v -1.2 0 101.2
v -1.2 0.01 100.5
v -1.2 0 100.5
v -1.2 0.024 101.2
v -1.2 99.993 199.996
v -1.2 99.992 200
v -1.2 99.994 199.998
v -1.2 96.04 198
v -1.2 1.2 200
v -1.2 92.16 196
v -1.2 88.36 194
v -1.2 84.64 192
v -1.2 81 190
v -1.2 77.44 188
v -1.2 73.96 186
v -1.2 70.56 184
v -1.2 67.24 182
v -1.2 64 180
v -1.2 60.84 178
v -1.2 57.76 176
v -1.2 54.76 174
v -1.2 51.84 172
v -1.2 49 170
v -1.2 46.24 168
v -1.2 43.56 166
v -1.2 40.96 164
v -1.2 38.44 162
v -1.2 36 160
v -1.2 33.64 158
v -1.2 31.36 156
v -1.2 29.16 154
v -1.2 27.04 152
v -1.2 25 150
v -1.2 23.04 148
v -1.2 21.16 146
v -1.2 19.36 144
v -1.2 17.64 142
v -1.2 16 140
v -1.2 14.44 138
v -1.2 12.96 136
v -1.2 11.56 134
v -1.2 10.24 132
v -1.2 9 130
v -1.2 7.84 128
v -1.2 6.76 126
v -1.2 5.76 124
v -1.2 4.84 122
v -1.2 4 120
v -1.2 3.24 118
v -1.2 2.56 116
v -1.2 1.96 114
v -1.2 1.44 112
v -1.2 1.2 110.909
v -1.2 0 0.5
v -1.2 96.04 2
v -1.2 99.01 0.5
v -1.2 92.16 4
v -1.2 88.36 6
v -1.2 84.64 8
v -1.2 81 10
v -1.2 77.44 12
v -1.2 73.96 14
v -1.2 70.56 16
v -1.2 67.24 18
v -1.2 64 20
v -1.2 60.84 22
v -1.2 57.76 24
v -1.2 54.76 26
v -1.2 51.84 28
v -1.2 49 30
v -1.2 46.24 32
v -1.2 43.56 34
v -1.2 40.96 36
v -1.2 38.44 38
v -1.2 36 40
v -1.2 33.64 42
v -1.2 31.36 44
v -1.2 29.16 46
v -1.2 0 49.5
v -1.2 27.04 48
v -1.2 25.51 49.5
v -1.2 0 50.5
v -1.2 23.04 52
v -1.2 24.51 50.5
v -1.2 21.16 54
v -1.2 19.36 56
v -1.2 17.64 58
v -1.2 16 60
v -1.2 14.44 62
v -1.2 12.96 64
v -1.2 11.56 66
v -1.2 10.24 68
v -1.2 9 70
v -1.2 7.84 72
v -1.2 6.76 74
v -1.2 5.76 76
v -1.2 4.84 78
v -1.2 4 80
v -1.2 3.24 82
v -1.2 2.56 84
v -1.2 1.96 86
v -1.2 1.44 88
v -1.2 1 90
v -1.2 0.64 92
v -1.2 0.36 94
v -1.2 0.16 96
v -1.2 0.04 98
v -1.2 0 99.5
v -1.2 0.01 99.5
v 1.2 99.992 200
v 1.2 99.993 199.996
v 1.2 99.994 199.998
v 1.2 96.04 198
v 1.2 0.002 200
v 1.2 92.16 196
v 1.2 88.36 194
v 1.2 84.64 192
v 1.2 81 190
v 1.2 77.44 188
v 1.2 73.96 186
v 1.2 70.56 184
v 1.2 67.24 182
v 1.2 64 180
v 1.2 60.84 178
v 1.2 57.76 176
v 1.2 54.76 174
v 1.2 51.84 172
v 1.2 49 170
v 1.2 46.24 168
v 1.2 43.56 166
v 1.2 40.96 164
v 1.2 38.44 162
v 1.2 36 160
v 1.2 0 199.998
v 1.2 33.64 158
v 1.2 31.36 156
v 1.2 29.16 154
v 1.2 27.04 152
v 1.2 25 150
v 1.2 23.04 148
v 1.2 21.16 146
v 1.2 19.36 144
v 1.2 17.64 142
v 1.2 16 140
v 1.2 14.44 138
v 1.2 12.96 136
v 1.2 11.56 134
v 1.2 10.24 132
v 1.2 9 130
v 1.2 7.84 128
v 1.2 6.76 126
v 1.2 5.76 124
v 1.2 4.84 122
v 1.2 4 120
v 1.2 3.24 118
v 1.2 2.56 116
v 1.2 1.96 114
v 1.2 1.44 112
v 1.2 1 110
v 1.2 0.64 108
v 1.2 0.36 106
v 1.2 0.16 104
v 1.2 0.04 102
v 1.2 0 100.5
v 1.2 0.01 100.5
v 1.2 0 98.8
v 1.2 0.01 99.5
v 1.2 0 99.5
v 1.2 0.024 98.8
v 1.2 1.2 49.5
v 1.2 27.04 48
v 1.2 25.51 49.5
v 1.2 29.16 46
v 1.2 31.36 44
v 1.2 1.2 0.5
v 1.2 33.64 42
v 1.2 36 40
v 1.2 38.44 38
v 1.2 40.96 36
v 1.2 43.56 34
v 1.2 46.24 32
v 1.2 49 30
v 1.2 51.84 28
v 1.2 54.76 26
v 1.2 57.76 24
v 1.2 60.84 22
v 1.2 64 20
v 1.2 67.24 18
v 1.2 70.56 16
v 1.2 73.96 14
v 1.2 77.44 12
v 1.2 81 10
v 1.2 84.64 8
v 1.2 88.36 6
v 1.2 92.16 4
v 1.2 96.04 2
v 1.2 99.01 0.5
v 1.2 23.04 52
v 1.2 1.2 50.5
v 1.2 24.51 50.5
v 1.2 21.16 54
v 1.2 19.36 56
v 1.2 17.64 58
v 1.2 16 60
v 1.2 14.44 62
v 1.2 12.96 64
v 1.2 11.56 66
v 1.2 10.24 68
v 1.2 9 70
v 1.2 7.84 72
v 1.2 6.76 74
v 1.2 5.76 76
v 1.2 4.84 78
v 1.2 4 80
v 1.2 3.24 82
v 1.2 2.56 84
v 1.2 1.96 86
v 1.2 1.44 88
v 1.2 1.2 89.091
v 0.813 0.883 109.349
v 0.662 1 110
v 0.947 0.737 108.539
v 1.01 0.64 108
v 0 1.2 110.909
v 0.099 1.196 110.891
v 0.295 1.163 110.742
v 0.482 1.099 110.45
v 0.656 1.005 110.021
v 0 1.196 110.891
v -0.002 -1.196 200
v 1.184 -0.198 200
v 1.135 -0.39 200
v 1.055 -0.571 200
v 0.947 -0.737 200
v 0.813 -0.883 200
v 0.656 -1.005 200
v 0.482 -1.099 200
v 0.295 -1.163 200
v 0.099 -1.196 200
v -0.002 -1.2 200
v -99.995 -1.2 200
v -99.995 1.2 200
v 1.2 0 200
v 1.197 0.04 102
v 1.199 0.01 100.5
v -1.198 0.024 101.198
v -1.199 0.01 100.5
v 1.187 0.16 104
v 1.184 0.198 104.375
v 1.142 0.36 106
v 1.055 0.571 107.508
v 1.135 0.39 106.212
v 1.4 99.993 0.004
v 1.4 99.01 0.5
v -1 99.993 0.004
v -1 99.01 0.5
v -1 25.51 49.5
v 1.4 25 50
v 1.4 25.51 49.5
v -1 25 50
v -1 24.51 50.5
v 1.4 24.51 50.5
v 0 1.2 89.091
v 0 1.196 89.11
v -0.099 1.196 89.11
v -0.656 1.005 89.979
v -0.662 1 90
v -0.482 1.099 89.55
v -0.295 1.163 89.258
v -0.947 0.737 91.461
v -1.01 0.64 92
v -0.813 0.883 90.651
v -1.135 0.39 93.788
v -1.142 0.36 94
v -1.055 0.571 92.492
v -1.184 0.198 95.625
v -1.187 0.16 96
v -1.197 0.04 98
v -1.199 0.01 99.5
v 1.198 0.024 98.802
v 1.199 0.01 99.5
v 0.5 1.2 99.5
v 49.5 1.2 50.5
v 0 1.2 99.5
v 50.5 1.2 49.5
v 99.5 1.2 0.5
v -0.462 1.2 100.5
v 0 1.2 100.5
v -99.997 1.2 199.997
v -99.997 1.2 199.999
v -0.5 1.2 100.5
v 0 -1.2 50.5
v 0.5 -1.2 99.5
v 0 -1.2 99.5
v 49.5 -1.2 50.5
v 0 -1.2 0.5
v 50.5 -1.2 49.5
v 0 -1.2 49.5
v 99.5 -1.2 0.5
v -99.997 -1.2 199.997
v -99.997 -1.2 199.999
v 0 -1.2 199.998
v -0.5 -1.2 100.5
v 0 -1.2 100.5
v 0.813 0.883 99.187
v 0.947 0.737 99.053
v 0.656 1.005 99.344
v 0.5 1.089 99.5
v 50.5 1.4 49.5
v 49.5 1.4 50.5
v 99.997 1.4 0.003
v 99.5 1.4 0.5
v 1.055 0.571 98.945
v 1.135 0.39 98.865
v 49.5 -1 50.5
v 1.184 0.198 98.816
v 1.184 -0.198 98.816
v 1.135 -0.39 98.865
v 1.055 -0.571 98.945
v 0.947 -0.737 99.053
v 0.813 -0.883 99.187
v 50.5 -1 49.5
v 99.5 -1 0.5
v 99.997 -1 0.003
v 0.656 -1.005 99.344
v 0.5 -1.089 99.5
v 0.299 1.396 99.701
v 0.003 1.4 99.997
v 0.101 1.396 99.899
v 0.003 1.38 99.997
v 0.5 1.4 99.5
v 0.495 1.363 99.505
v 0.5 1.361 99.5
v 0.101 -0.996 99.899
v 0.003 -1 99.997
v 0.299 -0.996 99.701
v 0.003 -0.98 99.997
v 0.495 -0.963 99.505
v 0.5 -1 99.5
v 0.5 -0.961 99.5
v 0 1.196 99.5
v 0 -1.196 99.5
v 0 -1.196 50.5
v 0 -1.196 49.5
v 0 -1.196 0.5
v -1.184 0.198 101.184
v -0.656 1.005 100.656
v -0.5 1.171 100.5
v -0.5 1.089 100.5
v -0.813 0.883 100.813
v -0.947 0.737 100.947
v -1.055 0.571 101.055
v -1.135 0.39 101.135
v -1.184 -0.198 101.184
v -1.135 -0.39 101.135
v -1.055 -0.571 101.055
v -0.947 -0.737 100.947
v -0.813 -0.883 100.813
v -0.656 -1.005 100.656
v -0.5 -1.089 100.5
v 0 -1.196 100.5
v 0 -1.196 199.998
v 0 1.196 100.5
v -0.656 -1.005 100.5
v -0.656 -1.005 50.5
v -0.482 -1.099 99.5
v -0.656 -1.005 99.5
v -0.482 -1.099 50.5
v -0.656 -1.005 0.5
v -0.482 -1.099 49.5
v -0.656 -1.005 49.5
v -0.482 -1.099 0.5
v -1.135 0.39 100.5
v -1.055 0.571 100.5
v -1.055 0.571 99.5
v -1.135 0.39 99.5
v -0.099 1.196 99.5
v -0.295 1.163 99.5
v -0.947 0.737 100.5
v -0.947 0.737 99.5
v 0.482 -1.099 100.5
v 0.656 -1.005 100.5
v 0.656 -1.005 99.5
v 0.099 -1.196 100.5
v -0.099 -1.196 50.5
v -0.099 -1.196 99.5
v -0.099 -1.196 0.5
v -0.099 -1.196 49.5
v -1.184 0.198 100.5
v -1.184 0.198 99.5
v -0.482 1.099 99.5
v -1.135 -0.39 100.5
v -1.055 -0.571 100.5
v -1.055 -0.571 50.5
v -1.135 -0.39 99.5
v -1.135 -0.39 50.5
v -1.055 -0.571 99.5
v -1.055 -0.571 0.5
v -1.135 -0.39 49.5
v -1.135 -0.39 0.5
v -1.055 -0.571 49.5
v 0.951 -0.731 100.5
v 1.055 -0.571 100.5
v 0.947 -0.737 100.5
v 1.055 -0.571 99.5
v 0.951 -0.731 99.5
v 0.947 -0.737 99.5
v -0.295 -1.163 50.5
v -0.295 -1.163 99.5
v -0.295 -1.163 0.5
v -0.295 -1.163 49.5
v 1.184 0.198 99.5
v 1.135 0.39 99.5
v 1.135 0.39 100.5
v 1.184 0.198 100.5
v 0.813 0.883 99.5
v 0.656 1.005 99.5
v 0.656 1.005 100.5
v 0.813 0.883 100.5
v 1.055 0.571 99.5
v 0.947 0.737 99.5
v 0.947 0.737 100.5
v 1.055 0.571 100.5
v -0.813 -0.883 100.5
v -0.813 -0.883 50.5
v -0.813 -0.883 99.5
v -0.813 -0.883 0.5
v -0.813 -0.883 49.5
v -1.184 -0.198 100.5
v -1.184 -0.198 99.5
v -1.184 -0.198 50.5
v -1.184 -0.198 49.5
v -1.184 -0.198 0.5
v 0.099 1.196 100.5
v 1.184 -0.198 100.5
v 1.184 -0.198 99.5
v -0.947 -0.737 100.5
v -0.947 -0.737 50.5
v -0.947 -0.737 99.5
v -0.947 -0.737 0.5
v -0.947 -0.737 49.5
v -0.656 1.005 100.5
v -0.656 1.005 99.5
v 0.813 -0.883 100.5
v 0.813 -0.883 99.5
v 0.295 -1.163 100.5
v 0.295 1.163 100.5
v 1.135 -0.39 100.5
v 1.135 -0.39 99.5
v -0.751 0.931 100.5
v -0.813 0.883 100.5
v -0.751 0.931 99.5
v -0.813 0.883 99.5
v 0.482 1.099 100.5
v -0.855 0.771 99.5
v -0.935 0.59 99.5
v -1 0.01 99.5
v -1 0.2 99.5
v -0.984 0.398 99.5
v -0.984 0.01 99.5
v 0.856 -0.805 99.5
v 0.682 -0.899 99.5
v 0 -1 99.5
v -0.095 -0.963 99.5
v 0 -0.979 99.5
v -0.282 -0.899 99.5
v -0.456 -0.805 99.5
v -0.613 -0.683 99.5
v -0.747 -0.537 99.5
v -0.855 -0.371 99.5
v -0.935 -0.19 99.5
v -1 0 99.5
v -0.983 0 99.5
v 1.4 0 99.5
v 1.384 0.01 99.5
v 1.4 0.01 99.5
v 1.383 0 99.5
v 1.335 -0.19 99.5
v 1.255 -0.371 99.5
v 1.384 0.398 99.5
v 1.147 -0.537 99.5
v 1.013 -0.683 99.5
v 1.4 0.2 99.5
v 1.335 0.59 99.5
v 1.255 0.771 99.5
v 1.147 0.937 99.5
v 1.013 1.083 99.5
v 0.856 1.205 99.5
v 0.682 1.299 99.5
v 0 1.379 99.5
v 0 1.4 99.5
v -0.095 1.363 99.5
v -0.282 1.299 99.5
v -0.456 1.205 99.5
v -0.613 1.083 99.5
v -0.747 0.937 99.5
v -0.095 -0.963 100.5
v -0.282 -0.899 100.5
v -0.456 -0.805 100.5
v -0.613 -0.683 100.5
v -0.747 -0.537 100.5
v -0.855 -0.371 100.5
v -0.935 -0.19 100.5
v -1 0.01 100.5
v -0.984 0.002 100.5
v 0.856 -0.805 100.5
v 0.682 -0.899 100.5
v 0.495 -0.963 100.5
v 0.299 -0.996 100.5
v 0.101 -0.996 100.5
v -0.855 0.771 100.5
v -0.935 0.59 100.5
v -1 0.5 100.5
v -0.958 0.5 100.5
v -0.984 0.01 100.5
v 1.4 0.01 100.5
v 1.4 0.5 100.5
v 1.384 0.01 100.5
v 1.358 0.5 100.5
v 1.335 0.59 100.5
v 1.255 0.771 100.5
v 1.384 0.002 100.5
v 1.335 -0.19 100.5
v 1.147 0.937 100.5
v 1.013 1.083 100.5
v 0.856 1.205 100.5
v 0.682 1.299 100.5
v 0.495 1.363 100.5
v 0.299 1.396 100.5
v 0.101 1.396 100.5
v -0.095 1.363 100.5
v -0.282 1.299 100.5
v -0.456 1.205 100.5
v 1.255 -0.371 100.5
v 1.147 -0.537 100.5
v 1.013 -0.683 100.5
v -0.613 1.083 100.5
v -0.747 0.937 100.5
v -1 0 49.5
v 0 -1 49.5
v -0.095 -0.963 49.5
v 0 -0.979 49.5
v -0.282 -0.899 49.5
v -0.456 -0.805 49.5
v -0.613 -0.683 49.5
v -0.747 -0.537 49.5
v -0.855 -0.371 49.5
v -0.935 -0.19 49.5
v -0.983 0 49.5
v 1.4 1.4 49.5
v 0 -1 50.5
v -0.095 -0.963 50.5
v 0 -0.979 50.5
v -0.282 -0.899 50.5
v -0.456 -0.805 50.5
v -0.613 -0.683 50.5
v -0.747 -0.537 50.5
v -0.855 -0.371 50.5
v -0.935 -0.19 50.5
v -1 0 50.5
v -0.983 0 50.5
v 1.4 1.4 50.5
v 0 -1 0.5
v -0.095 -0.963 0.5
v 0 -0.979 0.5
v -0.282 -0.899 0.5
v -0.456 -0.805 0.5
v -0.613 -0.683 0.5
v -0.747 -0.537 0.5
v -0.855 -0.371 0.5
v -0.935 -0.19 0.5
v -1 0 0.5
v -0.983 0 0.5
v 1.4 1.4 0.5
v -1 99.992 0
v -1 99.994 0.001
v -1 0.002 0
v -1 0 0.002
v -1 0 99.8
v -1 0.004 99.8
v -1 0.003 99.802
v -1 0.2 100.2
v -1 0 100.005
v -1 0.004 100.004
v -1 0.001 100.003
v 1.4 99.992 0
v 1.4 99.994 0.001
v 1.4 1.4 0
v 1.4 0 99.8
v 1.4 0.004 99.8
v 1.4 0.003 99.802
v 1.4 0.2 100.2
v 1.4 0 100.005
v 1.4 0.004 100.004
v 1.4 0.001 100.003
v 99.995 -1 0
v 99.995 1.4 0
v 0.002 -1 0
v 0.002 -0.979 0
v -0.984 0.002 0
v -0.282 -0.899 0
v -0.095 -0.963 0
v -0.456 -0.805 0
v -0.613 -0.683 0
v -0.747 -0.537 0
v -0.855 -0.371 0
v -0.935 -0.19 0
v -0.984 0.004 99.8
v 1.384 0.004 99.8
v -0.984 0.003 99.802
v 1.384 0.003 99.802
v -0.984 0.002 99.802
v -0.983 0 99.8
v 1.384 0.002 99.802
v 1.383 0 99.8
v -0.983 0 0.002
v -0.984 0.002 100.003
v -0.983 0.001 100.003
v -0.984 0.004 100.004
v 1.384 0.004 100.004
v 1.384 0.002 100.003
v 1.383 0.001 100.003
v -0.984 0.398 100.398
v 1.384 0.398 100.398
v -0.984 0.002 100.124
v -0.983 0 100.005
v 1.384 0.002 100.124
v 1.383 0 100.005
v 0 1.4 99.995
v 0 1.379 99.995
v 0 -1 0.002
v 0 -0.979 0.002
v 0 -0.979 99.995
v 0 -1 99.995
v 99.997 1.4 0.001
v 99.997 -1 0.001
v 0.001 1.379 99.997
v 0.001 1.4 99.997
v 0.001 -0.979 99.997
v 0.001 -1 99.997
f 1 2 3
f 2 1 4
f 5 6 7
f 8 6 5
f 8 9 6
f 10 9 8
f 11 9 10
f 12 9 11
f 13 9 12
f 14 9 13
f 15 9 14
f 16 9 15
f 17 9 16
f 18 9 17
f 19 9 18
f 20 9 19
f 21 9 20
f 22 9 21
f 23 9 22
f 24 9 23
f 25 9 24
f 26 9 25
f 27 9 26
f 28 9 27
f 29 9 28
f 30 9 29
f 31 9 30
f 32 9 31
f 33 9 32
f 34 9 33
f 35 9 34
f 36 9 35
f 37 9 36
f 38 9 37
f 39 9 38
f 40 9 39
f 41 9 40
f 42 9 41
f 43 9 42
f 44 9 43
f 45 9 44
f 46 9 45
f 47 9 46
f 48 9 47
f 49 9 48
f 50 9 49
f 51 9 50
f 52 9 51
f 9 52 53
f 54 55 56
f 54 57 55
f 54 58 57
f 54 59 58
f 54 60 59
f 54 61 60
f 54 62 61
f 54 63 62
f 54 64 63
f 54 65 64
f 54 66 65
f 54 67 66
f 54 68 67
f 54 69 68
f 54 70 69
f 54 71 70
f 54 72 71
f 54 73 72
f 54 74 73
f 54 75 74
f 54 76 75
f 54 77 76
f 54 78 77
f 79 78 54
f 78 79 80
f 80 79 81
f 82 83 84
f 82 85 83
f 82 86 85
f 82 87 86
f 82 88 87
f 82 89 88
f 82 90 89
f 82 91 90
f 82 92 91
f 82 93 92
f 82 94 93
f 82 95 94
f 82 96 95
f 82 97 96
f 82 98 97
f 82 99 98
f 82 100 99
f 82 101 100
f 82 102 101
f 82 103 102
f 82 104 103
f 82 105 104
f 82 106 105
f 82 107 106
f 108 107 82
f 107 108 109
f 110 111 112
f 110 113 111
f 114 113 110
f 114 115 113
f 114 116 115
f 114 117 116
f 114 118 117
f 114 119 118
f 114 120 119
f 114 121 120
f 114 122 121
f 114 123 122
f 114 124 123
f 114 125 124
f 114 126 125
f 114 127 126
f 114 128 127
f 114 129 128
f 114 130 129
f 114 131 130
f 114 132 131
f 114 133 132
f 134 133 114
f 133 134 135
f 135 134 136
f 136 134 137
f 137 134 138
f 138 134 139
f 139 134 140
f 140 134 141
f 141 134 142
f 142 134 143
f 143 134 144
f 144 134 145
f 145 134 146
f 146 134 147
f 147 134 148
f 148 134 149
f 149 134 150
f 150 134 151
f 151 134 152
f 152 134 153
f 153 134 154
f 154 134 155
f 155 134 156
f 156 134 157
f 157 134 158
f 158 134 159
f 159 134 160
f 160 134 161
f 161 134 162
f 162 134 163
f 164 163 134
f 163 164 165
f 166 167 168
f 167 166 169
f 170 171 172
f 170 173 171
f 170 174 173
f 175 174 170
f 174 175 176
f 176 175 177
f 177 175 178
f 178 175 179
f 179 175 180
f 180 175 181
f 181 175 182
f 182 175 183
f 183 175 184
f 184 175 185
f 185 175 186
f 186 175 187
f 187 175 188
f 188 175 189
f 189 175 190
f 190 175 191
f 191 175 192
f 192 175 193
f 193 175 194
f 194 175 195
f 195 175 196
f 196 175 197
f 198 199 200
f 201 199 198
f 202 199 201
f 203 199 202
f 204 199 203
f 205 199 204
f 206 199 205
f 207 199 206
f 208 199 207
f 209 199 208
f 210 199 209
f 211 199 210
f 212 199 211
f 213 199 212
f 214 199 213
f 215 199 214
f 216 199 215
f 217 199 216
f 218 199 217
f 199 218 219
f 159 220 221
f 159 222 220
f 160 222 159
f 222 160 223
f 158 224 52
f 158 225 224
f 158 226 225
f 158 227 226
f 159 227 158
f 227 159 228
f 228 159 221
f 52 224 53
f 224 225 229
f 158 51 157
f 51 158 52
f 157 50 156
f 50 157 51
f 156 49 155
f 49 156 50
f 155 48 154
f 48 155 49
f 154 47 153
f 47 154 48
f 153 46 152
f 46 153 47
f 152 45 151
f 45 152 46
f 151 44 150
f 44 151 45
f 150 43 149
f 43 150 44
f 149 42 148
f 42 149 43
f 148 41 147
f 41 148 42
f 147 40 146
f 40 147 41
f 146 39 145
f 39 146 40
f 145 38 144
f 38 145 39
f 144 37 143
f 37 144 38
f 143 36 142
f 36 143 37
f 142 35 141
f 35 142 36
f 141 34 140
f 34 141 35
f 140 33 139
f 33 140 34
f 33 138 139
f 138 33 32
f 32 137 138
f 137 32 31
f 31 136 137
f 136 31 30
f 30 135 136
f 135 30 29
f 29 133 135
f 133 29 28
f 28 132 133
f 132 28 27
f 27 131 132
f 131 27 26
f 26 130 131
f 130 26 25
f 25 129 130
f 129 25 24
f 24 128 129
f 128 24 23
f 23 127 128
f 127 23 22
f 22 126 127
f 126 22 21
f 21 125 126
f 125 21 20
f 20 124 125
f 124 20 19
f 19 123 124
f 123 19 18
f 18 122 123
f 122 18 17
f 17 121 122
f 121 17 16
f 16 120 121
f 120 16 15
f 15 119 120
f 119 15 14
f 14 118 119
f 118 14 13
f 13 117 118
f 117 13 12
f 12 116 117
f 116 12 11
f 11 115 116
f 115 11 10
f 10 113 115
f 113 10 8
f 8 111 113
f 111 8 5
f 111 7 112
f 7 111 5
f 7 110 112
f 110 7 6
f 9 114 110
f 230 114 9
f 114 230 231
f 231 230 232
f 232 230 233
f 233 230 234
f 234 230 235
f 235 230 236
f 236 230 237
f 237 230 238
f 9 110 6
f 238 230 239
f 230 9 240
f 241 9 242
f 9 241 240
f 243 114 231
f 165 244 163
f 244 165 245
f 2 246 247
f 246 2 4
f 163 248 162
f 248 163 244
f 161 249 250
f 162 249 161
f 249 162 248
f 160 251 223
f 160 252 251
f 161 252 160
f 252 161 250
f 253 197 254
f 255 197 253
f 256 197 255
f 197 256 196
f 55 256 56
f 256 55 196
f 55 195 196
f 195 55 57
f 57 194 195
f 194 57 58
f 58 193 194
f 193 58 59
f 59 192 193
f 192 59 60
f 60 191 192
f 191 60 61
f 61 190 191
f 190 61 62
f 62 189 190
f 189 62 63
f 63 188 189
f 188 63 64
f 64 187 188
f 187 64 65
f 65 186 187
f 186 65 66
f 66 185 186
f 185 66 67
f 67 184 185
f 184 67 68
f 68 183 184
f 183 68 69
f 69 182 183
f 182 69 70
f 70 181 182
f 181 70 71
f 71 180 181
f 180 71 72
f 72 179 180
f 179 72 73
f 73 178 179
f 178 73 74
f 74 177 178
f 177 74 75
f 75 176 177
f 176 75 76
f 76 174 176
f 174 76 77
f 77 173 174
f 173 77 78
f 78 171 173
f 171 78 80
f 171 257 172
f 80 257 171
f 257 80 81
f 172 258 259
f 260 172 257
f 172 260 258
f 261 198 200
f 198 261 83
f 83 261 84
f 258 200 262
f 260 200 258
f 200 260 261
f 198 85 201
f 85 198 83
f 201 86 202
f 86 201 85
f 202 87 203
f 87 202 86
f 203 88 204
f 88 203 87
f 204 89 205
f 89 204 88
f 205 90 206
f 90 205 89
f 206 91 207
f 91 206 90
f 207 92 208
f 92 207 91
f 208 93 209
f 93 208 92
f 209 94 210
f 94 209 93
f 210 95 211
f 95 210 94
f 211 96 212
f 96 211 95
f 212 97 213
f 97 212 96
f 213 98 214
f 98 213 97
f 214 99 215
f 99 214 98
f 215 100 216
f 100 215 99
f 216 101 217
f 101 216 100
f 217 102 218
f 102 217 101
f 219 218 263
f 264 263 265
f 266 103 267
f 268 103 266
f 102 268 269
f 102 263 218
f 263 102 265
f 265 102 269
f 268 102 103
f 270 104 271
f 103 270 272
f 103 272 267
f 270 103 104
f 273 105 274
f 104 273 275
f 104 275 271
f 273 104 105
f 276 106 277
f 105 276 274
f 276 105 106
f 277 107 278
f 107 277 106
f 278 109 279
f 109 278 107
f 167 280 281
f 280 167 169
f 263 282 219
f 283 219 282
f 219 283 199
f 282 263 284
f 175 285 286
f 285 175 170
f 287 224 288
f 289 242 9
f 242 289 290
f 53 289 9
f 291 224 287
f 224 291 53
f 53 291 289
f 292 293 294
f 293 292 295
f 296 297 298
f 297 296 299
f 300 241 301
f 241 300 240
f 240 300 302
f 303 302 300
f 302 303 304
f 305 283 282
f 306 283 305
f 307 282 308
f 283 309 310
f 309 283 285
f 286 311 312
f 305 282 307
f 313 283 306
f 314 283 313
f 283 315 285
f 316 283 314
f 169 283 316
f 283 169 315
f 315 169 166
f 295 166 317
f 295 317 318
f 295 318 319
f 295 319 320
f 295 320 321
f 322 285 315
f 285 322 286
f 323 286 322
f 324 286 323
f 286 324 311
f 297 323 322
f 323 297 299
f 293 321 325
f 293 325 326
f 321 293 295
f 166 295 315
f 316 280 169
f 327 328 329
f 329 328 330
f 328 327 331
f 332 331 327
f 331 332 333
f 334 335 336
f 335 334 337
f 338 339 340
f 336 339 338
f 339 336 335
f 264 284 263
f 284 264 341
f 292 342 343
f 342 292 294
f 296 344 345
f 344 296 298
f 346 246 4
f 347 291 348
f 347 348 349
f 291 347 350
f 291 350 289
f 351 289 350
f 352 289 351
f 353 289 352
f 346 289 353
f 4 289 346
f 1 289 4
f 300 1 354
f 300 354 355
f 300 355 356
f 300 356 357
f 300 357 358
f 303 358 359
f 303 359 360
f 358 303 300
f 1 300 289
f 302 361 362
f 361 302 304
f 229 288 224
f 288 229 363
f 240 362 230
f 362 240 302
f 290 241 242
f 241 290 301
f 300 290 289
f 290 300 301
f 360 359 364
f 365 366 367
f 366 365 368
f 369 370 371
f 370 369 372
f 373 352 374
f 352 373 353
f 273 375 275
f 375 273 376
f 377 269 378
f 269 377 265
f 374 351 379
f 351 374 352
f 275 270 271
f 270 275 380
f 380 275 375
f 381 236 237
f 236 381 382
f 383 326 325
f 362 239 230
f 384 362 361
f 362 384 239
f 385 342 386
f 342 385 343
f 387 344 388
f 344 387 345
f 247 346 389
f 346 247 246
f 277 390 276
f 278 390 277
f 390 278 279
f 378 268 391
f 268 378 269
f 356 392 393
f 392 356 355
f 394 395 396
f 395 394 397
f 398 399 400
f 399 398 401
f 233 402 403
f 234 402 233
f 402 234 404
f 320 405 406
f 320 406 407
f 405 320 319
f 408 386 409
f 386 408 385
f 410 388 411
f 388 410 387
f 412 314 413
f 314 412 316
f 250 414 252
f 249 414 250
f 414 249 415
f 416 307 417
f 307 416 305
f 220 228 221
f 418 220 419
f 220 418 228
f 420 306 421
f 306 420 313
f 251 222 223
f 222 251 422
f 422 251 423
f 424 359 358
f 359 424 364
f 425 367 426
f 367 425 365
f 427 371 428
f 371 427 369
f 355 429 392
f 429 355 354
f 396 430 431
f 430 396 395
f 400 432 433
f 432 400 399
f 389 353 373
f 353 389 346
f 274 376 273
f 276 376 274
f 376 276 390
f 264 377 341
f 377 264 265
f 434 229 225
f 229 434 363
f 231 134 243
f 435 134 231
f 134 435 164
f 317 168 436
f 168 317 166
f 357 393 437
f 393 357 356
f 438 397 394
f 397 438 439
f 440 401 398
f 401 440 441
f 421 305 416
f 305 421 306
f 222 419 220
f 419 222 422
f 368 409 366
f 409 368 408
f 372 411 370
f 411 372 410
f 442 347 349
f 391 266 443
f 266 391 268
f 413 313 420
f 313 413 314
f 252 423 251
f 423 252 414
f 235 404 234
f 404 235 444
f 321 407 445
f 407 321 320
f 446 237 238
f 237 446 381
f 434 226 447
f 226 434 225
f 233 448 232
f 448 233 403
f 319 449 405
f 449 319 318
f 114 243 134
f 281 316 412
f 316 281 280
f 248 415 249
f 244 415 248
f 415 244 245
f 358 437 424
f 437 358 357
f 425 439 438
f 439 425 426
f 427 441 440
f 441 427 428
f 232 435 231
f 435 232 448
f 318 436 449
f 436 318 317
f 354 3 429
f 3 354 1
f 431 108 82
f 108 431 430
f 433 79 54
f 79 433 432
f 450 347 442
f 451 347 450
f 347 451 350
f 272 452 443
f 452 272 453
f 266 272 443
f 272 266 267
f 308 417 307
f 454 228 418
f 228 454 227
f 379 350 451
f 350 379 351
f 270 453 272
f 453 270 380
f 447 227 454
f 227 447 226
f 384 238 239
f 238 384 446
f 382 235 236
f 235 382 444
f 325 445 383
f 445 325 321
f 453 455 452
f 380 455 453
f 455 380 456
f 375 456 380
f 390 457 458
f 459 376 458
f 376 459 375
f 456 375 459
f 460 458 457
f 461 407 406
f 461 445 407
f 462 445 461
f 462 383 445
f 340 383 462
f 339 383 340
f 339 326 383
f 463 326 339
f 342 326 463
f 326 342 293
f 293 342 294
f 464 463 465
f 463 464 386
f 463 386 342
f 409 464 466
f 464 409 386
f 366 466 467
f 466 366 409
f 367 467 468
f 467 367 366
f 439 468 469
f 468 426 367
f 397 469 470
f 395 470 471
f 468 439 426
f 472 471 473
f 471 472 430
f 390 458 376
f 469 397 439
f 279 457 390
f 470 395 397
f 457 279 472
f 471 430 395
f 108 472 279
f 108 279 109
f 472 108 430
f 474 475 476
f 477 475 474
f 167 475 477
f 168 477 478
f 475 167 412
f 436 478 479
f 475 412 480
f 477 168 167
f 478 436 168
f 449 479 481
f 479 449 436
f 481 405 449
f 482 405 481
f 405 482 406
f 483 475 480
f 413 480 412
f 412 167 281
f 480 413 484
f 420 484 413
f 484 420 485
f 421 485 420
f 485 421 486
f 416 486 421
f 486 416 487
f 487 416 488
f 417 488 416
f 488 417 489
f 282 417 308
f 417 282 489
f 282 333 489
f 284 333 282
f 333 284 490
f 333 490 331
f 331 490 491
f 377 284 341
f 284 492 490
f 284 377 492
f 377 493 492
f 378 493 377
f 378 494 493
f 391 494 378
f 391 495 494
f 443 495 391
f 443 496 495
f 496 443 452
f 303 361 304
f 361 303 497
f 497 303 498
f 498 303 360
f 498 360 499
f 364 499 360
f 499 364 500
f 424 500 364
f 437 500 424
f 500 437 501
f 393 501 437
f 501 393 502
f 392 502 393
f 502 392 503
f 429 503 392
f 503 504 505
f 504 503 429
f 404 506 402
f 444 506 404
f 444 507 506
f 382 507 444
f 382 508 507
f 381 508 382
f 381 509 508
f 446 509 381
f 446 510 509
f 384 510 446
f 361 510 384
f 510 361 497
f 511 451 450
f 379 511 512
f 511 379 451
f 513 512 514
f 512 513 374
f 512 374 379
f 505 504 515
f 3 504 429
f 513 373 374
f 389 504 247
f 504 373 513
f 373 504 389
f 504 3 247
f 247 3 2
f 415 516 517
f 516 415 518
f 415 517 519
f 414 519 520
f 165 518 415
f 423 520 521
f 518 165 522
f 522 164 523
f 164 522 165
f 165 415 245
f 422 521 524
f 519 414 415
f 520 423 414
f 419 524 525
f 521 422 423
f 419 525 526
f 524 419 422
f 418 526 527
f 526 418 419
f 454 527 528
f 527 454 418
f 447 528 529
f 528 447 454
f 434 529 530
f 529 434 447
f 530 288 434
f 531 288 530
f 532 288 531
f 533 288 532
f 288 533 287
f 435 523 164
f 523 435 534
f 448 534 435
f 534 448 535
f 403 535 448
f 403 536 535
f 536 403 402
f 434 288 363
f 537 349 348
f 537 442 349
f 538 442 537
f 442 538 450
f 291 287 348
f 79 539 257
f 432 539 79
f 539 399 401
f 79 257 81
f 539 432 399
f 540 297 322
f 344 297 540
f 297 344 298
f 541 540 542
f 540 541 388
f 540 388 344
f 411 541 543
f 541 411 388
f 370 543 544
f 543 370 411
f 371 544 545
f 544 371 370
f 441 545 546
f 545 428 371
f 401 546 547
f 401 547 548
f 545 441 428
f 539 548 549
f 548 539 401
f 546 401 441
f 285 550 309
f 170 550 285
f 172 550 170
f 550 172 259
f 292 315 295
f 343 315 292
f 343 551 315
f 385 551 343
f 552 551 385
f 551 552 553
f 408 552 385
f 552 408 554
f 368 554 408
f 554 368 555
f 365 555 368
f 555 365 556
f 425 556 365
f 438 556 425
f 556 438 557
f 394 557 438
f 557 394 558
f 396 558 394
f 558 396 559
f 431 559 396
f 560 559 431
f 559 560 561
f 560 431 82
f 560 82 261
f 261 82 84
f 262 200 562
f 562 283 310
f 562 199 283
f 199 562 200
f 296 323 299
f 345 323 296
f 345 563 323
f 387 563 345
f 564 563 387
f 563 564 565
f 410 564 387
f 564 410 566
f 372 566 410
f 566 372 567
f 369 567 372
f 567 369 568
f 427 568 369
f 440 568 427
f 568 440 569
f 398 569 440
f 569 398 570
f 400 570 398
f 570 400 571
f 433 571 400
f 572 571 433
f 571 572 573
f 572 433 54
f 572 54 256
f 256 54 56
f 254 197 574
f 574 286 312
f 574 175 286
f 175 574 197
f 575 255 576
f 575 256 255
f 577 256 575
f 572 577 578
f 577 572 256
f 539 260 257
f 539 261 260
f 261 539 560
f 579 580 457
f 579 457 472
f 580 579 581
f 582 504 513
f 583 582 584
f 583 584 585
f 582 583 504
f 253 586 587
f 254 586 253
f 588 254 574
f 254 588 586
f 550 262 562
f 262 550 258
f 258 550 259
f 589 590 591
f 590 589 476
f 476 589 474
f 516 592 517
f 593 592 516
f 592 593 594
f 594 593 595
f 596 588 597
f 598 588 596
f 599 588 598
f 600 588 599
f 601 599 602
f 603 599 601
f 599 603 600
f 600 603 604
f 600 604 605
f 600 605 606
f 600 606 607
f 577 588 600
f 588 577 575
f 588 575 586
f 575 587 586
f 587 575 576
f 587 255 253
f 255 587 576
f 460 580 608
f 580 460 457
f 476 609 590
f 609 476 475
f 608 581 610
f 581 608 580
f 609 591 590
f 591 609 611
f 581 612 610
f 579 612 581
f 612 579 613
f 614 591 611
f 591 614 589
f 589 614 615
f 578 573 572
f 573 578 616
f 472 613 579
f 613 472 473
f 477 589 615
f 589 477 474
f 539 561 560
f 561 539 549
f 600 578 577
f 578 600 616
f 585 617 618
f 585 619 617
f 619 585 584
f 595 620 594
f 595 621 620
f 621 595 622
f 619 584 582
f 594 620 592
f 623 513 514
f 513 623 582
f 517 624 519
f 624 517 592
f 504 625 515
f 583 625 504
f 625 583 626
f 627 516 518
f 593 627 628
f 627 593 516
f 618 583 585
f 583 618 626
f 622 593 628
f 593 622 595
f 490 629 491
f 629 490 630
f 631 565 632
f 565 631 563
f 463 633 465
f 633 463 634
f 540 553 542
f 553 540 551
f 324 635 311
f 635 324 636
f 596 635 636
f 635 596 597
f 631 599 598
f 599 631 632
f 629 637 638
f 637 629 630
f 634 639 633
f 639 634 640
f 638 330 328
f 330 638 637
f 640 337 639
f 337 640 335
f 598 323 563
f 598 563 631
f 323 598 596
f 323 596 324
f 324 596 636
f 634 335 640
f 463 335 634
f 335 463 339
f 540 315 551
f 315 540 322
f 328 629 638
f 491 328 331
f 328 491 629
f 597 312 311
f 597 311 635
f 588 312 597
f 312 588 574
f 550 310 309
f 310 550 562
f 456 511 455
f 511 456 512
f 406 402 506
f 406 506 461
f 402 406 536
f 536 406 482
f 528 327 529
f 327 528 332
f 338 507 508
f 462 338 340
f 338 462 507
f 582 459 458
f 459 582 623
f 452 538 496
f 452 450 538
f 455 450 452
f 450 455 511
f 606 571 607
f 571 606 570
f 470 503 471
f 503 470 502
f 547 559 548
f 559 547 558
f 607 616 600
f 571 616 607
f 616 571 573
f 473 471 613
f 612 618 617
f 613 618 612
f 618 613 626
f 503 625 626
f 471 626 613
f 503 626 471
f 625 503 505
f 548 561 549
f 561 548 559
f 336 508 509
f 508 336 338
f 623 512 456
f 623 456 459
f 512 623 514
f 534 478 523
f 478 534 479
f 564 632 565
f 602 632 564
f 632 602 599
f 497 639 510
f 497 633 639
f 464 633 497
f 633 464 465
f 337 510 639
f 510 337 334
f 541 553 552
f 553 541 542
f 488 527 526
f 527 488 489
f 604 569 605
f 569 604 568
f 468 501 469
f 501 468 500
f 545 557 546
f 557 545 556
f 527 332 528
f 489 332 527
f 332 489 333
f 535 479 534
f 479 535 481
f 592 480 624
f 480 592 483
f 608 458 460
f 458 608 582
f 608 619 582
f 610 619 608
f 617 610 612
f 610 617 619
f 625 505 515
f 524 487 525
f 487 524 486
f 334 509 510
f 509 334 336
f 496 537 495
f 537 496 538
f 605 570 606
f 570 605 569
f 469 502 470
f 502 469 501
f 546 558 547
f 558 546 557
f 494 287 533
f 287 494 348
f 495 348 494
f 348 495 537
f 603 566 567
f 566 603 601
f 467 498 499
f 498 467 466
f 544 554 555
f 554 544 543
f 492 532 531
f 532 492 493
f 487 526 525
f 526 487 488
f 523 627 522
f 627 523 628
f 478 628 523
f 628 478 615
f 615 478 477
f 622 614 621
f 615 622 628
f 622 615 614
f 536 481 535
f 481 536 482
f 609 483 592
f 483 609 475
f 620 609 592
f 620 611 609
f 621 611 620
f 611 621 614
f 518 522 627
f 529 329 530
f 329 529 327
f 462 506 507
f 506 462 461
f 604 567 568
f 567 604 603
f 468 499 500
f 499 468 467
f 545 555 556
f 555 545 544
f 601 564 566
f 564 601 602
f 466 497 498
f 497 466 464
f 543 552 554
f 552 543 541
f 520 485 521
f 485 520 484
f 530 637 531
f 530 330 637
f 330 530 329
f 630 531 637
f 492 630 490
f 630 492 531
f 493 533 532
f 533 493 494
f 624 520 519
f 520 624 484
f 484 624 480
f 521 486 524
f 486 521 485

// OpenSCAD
xmin = -2;
xmax = 2;
step = (xmax - xmin) / 100;

c = 0;

xunit = 50;
thick = 2.4;

xmark = .2;


function f(x) = sin(x * 180 / PI) * 15;
function d(x) = cos(x * 180 / PI) * 15;

function f(x) = .5 * (pow(((x-5)), 3) + 126);
function d(x) = .5 * (3 * pow(((x-5)), 2));

function f(x) = 25 * (pow(((x)), 2)) + 0;
function d(x) = 25 * (2 * pow(((x)), 1));
/**/

x = [for(x = [xmin:step:xmax + step / 2]) x];
integral = integrate([for(x = x) d(x) * step], c);
	
$fs = .2;
$fa = 2;

translate([0, 0, xunit * xmax]) rotate([0, 90 ,0]) {
	difference() {
		union() {
			linear_extrude(thick, center = true) offset(xmax / 1000) offset(-xmax / 1000) polygon(concat([for(x = x) [x * xunit, f(x)]], [[xmax * xunit, 0], [xmin * xunit, 0]]));
			rotate([90, 0, 0]) linear_extrude(thick, center = true) offset(xmax / 1000) offset(-xmax / 1000) polygon(concat([for(x = x) [x * xunit, d(x)]], [[xmax * xunit, 0], [xmin * xunit, 0]]));
		rotate([0, 90, 0]) translate([0, 0, xmin * xunit]) cylinder(r = thick / 2, h = (xmax - xmin) * xunit);
		}
		for(x = [0:xmax]) translate([x * xunit, 0, 0]) cube([1, 1000, 1000], center = true);
	}
		
	#%translate([0, 0, xmark / 2]) linear_extrude(thick, center = true) offset(xmax / 1000) offset(-xmax / 1000) polygon(concat([for(i = [0:len(x) - 1]) [x[i] * xunit, integral[i]]], [[xmax * xunit, 0], [xmin * xunit, 0]]));
	#%rotate([90, 0, 0]) translate([0, 0, -xmark / 2]) linear_extrude(thick, center = true) offset(xmax / 1000) offset(-xmax / 1000) polygon(concat([for(x = x) [x * xunit, ((f(x) - f(x - step)) + (f(x + step) - f(x))) / 2 / step]], [[xmax * xunit, 0], [xmin * xunit, 0]]));
		
	intersection() {
		union() {
			translate([0, 0, xmark]) linear_extrude(thick, center = true) offset(xmax / 1000) offset(-xmax / 1000) polygon(concat([for(x = x) [x * xunit, f(x)]], [[max(x) * xunit, 0], [0, 0]]));
			rotate([90, 0, 0]) translate([0, 0, -xmark]) linear_extrude(thick, center = true) offset(xmax / 1000) offset(-xmax / 1000) polygon(concat([for(x = x) [x * xunit, d(x)]], [[max(x) * xunit, 0], [0, 0]]));
			rotate([0, 90, 0]) translate([-xmark, xmark, xmin * xunit]) cylinder(r = thick / 2, h = (xmax - xmin) * xunit);
		}
		for(x = [0:xmax]) translate([x * xunit, 0, 0]) cube([1, 1000, 1000], center = true);
	}
}

function integrate(v, c = 0, sum = []) = (len(v) == len(sum)) ? sum : integrate(v, c, concat(sum, [len(sum) ? sum[len(sum) - 1] + v[len(sum)] : v[0] + c]));
